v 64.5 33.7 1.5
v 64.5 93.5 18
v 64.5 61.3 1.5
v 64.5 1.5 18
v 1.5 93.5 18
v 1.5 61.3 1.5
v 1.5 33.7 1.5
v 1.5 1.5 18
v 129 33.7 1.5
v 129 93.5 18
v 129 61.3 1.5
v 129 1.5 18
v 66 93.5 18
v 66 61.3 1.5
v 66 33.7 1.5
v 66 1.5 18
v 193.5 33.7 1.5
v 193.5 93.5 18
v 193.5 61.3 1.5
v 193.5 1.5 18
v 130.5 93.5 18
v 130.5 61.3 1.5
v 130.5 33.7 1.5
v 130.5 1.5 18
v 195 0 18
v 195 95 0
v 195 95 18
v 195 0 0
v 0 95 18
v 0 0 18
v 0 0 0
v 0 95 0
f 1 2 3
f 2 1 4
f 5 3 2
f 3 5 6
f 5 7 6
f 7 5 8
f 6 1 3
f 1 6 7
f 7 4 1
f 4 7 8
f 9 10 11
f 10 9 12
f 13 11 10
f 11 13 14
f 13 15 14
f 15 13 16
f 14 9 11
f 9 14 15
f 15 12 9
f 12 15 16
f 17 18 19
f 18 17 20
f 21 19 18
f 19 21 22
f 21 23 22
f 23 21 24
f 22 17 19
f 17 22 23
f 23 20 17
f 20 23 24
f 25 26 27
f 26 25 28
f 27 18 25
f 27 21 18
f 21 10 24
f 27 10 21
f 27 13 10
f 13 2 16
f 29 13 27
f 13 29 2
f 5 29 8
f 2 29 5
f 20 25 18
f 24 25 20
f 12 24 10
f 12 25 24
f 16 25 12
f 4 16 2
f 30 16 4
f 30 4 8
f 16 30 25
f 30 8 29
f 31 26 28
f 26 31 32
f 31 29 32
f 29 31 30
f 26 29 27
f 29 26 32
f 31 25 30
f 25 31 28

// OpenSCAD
//In mm, how wide should the tray be??
tray_width = 195; //[1:200]

//In mm, how long should the tray be??
tray_length = 95; //[1:200]

//In mm, how tall should the tray be??
tray_height = 18; //[1:50]

//How many areas should the tray be divided into?
number_of_divisions = 3; //[1:20]

/* [Advanced] */
// In mm, how thick should the tray walls be?
thickness_of_walls = 1.5; //[1:0.1:5]

//In mm, how tall should the rim at the top of the tray be?
size_of_rim = 0; //[0:0.25:5]

// What percentage of tray bottom should be flat?
size_of_bottom = 30; //[0:100]

// ########## Project Space #########
tray(tray_width, tray_length, tray_height, number_of_divisions, size_of_bottom, size_of_rim, thickness_of_walls);

// ############ Modules #############
module tray (width, length, height, divisions, bottom, tray_rim, wall_thickness) {
	division_width = (width - (wall_thickness * divisions + wall_thickness)) / divisions;
	division_length = length - (wall_thickness * 2);
	division_bottom = division_length * (bottom * 0.01);
	division_bottom_offset = (division_length - division_bottom) / 2;
		
	division_x_offset = division_width + wall_thickness;

	difference() {
		cube([width, length, height]);

		for (x = [wall_thickness : division_x_offset : width - wall_thickness]){	
			hull(){
				translate([x, wall_thickness, wall_thickness]) {
					translate([0, 0, height - wall_thickness - tray_rim]) cube([division_width, division_length, height]);
					translate([0, division_bottom_offset, 0]) cube([division_width, division_bottom, height]);
				}
			}
		}
	}
}
